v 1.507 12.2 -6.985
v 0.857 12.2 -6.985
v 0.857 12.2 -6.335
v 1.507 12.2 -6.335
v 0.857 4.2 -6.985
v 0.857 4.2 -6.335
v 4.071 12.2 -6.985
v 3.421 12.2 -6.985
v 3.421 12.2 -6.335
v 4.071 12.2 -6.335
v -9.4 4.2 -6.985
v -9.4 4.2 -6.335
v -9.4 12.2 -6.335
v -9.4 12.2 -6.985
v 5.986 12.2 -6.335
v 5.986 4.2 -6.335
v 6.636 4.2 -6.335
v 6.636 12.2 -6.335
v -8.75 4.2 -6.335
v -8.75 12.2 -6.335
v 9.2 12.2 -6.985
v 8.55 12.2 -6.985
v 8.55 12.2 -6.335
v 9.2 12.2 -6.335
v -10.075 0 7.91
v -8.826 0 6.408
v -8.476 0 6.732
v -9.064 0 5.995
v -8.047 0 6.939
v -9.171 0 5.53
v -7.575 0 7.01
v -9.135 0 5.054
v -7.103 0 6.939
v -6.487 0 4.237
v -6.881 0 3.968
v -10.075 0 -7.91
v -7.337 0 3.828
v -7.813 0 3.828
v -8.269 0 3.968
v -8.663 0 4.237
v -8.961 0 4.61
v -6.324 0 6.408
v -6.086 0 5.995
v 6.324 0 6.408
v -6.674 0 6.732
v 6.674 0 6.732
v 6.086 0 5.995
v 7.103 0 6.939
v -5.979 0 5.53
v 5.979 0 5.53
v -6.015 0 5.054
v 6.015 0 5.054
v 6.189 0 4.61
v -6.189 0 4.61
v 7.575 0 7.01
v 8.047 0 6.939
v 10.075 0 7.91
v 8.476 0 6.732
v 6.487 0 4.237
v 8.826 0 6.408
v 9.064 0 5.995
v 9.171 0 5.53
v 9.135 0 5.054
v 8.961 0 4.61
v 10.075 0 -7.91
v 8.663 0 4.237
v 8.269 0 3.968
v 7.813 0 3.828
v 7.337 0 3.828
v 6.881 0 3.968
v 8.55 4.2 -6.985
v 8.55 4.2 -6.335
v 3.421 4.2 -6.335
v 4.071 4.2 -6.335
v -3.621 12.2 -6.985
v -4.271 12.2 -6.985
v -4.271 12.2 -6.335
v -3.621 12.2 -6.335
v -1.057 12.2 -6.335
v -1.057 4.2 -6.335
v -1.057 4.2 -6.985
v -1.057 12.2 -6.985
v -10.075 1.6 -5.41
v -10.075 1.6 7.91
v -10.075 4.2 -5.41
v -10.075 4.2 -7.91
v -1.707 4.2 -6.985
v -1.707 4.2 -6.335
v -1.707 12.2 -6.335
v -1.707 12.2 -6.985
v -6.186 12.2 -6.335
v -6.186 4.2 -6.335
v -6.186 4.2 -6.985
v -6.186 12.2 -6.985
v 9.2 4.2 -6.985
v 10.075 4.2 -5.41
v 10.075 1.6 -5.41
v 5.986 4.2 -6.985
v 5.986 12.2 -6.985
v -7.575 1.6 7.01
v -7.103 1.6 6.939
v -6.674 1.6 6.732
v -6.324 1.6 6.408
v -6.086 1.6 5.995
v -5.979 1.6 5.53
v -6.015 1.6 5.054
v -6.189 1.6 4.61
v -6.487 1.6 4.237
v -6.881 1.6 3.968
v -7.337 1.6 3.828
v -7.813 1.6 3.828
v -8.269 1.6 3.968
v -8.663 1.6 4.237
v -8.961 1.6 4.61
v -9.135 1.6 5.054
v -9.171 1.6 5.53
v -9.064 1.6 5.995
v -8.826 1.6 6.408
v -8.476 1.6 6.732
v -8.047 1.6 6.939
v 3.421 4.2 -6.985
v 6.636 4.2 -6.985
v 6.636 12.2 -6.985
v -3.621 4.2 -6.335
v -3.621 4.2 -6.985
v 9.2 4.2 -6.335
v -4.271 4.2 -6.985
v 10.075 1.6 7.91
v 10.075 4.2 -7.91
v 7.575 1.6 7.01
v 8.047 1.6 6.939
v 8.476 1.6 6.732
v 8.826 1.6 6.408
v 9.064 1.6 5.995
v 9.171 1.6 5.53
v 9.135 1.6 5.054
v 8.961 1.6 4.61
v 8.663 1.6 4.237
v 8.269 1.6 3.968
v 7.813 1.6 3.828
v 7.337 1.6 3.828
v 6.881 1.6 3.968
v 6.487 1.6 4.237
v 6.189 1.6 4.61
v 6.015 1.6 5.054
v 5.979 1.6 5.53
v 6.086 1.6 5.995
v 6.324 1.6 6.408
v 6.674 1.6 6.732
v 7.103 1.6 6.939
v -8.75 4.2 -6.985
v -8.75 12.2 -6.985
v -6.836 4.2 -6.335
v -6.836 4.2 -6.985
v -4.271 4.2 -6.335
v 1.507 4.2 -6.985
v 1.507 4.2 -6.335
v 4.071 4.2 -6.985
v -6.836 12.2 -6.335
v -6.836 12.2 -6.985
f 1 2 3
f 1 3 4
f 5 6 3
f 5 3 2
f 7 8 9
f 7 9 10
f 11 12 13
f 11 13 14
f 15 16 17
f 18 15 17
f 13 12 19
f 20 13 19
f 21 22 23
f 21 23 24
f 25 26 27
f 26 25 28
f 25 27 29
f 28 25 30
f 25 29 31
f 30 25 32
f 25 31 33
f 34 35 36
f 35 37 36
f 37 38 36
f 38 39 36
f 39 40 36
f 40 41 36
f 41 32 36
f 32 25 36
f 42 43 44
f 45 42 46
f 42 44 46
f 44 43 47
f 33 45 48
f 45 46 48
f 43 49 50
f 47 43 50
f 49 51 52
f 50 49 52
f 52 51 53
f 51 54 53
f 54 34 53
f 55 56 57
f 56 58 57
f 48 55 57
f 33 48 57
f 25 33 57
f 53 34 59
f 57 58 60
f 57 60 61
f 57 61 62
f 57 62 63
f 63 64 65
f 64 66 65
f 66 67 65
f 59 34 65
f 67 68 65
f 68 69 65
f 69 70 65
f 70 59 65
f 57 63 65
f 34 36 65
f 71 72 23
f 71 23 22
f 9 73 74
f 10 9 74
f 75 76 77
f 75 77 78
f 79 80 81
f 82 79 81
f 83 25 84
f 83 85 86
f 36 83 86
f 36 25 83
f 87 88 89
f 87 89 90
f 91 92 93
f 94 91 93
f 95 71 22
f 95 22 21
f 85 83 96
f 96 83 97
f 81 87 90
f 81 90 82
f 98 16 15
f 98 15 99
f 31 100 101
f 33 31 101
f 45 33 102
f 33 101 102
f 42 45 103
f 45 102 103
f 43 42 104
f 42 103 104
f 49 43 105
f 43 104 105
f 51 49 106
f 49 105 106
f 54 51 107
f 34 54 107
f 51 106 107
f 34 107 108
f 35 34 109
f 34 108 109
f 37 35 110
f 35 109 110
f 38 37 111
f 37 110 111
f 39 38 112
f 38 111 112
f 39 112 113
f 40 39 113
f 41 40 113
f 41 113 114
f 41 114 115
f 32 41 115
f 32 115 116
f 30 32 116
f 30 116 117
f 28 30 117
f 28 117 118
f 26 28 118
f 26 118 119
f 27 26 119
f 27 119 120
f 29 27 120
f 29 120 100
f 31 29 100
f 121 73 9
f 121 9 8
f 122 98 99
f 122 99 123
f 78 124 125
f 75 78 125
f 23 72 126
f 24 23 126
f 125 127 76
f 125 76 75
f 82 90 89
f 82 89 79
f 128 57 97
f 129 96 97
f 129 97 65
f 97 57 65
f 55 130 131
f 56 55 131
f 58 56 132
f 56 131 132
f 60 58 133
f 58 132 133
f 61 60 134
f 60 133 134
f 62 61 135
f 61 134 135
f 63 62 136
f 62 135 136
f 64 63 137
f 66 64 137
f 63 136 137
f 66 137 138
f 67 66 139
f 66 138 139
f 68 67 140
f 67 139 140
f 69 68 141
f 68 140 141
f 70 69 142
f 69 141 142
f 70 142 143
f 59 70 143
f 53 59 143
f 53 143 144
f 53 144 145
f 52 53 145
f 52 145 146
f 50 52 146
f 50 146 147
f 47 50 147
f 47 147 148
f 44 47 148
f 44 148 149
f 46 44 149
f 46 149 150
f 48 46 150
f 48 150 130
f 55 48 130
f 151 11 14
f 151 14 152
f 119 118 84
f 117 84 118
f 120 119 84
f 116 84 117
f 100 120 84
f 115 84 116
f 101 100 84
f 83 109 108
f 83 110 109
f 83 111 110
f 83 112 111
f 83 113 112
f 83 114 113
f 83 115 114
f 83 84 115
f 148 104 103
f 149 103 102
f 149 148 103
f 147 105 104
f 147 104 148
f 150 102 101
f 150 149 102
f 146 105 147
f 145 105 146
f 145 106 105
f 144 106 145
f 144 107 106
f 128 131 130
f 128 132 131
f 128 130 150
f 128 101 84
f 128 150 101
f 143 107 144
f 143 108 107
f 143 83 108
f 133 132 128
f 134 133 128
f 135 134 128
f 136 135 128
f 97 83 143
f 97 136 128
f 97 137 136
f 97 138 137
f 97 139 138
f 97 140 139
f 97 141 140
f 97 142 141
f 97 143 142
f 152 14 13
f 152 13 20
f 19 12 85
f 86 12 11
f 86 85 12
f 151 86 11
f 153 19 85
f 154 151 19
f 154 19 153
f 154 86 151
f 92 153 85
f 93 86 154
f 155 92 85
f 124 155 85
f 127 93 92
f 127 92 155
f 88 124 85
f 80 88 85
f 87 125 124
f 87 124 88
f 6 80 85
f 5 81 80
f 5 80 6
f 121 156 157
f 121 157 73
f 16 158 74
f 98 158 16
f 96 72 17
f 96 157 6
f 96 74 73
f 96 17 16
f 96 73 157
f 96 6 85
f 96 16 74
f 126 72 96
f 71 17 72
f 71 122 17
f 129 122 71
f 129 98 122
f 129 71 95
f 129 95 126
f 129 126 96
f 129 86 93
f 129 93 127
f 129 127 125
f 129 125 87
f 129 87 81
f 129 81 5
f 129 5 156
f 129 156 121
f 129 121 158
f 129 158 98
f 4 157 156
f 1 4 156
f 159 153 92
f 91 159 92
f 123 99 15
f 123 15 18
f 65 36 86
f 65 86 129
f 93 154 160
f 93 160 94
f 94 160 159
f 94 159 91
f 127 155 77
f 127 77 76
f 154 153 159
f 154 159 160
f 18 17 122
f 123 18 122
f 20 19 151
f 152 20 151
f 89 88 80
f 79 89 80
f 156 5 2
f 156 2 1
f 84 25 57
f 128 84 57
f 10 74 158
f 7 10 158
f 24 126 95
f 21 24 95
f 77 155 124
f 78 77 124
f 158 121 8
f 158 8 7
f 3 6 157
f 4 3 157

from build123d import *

# Parameters (mm, degrees)
SKETCH1_W           = 20.15
SKETCH1_H           = 15.82
BOSS_EXTRUDE1_DEPTH = 1.6
SKETCH2_R           = 1.6
CUT_EXTRUDE1_DEPTH  = 13.908668599
BOSS_EXTRUDE2_START = -1.6
SKETCH3_W           = 20.15
SKETCH3_H           = 2.5
BOSS_EXTRUDE2_DEPTH = 4.2
SKETCH5_W           = 0.65
SKETCH5_H           = 0.65
BOSS_EXTRUDE3_DEPTH = 8
LPATTERN1_COUNT     = 8
LPATTERN1_PITCH     = 2.564285714


with BuildPart() as part:
    # Sketch1 → Boss-Extrude1 (new body)
    with BuildSketch(Plane(origin=(0, 0, 0), x_dir=(1, 0, 0), z_dir=(0, 1, 0))):
        Rectangle(SKETCH1_W, SKETCH1_H)
    extrude(amount=BOSS_EXTRUDE1_DEPTH)

    # Sketch2 → Cut-Extrude1 (cut, through all)
    with BuildSketch(Plane(origin=(0, 1.6, 0), x_dir=(1, 0, 0), z_dir=(0, 1, 0))):
        with Locations(Location((-7.575, -5.41, 0), (0, 0, 270))):
            Circle(SKETCH2_R)
        with Locations(Location((7.575, -5.41, 0), (0, 0, 270))):
            Circle(SKETCH2_R)
    extrude(amount=-CUT_EXTRUDE1_DEPTH, mode=Mode.SUBTRACT)

    # Sketch3 → Boss-Extrude2 (add)
    with BuildSketch(Plane(origin=(0, 1.6, 0), x_dir=(1, 0, 0), z_dir=(0, 1, 0)).offset(BOSS_EXTRUDE2_START)):
        with Locations((0, 6.66)):
            Rectangle(SKETCH3_W, SKETCH3_H)
    extrude(amount=BOSS_EXTRUDE2_DEPTH)

    # Sketch5 → Boss-Extrude3 (add)
    with BuildSketch(Plane(origin=(0, 4.2, 0), x_dir=(1, 0, 0), z_dir=(0, 1, 0))):
        with Locations((-9.075, 6.66)):
            Rectangle(SKETCH5_W, SKETCH5_H)
    boss_extrude3 = extrude(amount=BOSS_EXTRUDE3_DEPTH)

    # LPattern1: Boss-Extrude3 ×8
    with Locations(*[(i * LPATTERN1_PITCH, 0, 0) for i in range(1, LPATTERN1_COUNT)]):
        add(boss_extrude3)


solid = part.part
